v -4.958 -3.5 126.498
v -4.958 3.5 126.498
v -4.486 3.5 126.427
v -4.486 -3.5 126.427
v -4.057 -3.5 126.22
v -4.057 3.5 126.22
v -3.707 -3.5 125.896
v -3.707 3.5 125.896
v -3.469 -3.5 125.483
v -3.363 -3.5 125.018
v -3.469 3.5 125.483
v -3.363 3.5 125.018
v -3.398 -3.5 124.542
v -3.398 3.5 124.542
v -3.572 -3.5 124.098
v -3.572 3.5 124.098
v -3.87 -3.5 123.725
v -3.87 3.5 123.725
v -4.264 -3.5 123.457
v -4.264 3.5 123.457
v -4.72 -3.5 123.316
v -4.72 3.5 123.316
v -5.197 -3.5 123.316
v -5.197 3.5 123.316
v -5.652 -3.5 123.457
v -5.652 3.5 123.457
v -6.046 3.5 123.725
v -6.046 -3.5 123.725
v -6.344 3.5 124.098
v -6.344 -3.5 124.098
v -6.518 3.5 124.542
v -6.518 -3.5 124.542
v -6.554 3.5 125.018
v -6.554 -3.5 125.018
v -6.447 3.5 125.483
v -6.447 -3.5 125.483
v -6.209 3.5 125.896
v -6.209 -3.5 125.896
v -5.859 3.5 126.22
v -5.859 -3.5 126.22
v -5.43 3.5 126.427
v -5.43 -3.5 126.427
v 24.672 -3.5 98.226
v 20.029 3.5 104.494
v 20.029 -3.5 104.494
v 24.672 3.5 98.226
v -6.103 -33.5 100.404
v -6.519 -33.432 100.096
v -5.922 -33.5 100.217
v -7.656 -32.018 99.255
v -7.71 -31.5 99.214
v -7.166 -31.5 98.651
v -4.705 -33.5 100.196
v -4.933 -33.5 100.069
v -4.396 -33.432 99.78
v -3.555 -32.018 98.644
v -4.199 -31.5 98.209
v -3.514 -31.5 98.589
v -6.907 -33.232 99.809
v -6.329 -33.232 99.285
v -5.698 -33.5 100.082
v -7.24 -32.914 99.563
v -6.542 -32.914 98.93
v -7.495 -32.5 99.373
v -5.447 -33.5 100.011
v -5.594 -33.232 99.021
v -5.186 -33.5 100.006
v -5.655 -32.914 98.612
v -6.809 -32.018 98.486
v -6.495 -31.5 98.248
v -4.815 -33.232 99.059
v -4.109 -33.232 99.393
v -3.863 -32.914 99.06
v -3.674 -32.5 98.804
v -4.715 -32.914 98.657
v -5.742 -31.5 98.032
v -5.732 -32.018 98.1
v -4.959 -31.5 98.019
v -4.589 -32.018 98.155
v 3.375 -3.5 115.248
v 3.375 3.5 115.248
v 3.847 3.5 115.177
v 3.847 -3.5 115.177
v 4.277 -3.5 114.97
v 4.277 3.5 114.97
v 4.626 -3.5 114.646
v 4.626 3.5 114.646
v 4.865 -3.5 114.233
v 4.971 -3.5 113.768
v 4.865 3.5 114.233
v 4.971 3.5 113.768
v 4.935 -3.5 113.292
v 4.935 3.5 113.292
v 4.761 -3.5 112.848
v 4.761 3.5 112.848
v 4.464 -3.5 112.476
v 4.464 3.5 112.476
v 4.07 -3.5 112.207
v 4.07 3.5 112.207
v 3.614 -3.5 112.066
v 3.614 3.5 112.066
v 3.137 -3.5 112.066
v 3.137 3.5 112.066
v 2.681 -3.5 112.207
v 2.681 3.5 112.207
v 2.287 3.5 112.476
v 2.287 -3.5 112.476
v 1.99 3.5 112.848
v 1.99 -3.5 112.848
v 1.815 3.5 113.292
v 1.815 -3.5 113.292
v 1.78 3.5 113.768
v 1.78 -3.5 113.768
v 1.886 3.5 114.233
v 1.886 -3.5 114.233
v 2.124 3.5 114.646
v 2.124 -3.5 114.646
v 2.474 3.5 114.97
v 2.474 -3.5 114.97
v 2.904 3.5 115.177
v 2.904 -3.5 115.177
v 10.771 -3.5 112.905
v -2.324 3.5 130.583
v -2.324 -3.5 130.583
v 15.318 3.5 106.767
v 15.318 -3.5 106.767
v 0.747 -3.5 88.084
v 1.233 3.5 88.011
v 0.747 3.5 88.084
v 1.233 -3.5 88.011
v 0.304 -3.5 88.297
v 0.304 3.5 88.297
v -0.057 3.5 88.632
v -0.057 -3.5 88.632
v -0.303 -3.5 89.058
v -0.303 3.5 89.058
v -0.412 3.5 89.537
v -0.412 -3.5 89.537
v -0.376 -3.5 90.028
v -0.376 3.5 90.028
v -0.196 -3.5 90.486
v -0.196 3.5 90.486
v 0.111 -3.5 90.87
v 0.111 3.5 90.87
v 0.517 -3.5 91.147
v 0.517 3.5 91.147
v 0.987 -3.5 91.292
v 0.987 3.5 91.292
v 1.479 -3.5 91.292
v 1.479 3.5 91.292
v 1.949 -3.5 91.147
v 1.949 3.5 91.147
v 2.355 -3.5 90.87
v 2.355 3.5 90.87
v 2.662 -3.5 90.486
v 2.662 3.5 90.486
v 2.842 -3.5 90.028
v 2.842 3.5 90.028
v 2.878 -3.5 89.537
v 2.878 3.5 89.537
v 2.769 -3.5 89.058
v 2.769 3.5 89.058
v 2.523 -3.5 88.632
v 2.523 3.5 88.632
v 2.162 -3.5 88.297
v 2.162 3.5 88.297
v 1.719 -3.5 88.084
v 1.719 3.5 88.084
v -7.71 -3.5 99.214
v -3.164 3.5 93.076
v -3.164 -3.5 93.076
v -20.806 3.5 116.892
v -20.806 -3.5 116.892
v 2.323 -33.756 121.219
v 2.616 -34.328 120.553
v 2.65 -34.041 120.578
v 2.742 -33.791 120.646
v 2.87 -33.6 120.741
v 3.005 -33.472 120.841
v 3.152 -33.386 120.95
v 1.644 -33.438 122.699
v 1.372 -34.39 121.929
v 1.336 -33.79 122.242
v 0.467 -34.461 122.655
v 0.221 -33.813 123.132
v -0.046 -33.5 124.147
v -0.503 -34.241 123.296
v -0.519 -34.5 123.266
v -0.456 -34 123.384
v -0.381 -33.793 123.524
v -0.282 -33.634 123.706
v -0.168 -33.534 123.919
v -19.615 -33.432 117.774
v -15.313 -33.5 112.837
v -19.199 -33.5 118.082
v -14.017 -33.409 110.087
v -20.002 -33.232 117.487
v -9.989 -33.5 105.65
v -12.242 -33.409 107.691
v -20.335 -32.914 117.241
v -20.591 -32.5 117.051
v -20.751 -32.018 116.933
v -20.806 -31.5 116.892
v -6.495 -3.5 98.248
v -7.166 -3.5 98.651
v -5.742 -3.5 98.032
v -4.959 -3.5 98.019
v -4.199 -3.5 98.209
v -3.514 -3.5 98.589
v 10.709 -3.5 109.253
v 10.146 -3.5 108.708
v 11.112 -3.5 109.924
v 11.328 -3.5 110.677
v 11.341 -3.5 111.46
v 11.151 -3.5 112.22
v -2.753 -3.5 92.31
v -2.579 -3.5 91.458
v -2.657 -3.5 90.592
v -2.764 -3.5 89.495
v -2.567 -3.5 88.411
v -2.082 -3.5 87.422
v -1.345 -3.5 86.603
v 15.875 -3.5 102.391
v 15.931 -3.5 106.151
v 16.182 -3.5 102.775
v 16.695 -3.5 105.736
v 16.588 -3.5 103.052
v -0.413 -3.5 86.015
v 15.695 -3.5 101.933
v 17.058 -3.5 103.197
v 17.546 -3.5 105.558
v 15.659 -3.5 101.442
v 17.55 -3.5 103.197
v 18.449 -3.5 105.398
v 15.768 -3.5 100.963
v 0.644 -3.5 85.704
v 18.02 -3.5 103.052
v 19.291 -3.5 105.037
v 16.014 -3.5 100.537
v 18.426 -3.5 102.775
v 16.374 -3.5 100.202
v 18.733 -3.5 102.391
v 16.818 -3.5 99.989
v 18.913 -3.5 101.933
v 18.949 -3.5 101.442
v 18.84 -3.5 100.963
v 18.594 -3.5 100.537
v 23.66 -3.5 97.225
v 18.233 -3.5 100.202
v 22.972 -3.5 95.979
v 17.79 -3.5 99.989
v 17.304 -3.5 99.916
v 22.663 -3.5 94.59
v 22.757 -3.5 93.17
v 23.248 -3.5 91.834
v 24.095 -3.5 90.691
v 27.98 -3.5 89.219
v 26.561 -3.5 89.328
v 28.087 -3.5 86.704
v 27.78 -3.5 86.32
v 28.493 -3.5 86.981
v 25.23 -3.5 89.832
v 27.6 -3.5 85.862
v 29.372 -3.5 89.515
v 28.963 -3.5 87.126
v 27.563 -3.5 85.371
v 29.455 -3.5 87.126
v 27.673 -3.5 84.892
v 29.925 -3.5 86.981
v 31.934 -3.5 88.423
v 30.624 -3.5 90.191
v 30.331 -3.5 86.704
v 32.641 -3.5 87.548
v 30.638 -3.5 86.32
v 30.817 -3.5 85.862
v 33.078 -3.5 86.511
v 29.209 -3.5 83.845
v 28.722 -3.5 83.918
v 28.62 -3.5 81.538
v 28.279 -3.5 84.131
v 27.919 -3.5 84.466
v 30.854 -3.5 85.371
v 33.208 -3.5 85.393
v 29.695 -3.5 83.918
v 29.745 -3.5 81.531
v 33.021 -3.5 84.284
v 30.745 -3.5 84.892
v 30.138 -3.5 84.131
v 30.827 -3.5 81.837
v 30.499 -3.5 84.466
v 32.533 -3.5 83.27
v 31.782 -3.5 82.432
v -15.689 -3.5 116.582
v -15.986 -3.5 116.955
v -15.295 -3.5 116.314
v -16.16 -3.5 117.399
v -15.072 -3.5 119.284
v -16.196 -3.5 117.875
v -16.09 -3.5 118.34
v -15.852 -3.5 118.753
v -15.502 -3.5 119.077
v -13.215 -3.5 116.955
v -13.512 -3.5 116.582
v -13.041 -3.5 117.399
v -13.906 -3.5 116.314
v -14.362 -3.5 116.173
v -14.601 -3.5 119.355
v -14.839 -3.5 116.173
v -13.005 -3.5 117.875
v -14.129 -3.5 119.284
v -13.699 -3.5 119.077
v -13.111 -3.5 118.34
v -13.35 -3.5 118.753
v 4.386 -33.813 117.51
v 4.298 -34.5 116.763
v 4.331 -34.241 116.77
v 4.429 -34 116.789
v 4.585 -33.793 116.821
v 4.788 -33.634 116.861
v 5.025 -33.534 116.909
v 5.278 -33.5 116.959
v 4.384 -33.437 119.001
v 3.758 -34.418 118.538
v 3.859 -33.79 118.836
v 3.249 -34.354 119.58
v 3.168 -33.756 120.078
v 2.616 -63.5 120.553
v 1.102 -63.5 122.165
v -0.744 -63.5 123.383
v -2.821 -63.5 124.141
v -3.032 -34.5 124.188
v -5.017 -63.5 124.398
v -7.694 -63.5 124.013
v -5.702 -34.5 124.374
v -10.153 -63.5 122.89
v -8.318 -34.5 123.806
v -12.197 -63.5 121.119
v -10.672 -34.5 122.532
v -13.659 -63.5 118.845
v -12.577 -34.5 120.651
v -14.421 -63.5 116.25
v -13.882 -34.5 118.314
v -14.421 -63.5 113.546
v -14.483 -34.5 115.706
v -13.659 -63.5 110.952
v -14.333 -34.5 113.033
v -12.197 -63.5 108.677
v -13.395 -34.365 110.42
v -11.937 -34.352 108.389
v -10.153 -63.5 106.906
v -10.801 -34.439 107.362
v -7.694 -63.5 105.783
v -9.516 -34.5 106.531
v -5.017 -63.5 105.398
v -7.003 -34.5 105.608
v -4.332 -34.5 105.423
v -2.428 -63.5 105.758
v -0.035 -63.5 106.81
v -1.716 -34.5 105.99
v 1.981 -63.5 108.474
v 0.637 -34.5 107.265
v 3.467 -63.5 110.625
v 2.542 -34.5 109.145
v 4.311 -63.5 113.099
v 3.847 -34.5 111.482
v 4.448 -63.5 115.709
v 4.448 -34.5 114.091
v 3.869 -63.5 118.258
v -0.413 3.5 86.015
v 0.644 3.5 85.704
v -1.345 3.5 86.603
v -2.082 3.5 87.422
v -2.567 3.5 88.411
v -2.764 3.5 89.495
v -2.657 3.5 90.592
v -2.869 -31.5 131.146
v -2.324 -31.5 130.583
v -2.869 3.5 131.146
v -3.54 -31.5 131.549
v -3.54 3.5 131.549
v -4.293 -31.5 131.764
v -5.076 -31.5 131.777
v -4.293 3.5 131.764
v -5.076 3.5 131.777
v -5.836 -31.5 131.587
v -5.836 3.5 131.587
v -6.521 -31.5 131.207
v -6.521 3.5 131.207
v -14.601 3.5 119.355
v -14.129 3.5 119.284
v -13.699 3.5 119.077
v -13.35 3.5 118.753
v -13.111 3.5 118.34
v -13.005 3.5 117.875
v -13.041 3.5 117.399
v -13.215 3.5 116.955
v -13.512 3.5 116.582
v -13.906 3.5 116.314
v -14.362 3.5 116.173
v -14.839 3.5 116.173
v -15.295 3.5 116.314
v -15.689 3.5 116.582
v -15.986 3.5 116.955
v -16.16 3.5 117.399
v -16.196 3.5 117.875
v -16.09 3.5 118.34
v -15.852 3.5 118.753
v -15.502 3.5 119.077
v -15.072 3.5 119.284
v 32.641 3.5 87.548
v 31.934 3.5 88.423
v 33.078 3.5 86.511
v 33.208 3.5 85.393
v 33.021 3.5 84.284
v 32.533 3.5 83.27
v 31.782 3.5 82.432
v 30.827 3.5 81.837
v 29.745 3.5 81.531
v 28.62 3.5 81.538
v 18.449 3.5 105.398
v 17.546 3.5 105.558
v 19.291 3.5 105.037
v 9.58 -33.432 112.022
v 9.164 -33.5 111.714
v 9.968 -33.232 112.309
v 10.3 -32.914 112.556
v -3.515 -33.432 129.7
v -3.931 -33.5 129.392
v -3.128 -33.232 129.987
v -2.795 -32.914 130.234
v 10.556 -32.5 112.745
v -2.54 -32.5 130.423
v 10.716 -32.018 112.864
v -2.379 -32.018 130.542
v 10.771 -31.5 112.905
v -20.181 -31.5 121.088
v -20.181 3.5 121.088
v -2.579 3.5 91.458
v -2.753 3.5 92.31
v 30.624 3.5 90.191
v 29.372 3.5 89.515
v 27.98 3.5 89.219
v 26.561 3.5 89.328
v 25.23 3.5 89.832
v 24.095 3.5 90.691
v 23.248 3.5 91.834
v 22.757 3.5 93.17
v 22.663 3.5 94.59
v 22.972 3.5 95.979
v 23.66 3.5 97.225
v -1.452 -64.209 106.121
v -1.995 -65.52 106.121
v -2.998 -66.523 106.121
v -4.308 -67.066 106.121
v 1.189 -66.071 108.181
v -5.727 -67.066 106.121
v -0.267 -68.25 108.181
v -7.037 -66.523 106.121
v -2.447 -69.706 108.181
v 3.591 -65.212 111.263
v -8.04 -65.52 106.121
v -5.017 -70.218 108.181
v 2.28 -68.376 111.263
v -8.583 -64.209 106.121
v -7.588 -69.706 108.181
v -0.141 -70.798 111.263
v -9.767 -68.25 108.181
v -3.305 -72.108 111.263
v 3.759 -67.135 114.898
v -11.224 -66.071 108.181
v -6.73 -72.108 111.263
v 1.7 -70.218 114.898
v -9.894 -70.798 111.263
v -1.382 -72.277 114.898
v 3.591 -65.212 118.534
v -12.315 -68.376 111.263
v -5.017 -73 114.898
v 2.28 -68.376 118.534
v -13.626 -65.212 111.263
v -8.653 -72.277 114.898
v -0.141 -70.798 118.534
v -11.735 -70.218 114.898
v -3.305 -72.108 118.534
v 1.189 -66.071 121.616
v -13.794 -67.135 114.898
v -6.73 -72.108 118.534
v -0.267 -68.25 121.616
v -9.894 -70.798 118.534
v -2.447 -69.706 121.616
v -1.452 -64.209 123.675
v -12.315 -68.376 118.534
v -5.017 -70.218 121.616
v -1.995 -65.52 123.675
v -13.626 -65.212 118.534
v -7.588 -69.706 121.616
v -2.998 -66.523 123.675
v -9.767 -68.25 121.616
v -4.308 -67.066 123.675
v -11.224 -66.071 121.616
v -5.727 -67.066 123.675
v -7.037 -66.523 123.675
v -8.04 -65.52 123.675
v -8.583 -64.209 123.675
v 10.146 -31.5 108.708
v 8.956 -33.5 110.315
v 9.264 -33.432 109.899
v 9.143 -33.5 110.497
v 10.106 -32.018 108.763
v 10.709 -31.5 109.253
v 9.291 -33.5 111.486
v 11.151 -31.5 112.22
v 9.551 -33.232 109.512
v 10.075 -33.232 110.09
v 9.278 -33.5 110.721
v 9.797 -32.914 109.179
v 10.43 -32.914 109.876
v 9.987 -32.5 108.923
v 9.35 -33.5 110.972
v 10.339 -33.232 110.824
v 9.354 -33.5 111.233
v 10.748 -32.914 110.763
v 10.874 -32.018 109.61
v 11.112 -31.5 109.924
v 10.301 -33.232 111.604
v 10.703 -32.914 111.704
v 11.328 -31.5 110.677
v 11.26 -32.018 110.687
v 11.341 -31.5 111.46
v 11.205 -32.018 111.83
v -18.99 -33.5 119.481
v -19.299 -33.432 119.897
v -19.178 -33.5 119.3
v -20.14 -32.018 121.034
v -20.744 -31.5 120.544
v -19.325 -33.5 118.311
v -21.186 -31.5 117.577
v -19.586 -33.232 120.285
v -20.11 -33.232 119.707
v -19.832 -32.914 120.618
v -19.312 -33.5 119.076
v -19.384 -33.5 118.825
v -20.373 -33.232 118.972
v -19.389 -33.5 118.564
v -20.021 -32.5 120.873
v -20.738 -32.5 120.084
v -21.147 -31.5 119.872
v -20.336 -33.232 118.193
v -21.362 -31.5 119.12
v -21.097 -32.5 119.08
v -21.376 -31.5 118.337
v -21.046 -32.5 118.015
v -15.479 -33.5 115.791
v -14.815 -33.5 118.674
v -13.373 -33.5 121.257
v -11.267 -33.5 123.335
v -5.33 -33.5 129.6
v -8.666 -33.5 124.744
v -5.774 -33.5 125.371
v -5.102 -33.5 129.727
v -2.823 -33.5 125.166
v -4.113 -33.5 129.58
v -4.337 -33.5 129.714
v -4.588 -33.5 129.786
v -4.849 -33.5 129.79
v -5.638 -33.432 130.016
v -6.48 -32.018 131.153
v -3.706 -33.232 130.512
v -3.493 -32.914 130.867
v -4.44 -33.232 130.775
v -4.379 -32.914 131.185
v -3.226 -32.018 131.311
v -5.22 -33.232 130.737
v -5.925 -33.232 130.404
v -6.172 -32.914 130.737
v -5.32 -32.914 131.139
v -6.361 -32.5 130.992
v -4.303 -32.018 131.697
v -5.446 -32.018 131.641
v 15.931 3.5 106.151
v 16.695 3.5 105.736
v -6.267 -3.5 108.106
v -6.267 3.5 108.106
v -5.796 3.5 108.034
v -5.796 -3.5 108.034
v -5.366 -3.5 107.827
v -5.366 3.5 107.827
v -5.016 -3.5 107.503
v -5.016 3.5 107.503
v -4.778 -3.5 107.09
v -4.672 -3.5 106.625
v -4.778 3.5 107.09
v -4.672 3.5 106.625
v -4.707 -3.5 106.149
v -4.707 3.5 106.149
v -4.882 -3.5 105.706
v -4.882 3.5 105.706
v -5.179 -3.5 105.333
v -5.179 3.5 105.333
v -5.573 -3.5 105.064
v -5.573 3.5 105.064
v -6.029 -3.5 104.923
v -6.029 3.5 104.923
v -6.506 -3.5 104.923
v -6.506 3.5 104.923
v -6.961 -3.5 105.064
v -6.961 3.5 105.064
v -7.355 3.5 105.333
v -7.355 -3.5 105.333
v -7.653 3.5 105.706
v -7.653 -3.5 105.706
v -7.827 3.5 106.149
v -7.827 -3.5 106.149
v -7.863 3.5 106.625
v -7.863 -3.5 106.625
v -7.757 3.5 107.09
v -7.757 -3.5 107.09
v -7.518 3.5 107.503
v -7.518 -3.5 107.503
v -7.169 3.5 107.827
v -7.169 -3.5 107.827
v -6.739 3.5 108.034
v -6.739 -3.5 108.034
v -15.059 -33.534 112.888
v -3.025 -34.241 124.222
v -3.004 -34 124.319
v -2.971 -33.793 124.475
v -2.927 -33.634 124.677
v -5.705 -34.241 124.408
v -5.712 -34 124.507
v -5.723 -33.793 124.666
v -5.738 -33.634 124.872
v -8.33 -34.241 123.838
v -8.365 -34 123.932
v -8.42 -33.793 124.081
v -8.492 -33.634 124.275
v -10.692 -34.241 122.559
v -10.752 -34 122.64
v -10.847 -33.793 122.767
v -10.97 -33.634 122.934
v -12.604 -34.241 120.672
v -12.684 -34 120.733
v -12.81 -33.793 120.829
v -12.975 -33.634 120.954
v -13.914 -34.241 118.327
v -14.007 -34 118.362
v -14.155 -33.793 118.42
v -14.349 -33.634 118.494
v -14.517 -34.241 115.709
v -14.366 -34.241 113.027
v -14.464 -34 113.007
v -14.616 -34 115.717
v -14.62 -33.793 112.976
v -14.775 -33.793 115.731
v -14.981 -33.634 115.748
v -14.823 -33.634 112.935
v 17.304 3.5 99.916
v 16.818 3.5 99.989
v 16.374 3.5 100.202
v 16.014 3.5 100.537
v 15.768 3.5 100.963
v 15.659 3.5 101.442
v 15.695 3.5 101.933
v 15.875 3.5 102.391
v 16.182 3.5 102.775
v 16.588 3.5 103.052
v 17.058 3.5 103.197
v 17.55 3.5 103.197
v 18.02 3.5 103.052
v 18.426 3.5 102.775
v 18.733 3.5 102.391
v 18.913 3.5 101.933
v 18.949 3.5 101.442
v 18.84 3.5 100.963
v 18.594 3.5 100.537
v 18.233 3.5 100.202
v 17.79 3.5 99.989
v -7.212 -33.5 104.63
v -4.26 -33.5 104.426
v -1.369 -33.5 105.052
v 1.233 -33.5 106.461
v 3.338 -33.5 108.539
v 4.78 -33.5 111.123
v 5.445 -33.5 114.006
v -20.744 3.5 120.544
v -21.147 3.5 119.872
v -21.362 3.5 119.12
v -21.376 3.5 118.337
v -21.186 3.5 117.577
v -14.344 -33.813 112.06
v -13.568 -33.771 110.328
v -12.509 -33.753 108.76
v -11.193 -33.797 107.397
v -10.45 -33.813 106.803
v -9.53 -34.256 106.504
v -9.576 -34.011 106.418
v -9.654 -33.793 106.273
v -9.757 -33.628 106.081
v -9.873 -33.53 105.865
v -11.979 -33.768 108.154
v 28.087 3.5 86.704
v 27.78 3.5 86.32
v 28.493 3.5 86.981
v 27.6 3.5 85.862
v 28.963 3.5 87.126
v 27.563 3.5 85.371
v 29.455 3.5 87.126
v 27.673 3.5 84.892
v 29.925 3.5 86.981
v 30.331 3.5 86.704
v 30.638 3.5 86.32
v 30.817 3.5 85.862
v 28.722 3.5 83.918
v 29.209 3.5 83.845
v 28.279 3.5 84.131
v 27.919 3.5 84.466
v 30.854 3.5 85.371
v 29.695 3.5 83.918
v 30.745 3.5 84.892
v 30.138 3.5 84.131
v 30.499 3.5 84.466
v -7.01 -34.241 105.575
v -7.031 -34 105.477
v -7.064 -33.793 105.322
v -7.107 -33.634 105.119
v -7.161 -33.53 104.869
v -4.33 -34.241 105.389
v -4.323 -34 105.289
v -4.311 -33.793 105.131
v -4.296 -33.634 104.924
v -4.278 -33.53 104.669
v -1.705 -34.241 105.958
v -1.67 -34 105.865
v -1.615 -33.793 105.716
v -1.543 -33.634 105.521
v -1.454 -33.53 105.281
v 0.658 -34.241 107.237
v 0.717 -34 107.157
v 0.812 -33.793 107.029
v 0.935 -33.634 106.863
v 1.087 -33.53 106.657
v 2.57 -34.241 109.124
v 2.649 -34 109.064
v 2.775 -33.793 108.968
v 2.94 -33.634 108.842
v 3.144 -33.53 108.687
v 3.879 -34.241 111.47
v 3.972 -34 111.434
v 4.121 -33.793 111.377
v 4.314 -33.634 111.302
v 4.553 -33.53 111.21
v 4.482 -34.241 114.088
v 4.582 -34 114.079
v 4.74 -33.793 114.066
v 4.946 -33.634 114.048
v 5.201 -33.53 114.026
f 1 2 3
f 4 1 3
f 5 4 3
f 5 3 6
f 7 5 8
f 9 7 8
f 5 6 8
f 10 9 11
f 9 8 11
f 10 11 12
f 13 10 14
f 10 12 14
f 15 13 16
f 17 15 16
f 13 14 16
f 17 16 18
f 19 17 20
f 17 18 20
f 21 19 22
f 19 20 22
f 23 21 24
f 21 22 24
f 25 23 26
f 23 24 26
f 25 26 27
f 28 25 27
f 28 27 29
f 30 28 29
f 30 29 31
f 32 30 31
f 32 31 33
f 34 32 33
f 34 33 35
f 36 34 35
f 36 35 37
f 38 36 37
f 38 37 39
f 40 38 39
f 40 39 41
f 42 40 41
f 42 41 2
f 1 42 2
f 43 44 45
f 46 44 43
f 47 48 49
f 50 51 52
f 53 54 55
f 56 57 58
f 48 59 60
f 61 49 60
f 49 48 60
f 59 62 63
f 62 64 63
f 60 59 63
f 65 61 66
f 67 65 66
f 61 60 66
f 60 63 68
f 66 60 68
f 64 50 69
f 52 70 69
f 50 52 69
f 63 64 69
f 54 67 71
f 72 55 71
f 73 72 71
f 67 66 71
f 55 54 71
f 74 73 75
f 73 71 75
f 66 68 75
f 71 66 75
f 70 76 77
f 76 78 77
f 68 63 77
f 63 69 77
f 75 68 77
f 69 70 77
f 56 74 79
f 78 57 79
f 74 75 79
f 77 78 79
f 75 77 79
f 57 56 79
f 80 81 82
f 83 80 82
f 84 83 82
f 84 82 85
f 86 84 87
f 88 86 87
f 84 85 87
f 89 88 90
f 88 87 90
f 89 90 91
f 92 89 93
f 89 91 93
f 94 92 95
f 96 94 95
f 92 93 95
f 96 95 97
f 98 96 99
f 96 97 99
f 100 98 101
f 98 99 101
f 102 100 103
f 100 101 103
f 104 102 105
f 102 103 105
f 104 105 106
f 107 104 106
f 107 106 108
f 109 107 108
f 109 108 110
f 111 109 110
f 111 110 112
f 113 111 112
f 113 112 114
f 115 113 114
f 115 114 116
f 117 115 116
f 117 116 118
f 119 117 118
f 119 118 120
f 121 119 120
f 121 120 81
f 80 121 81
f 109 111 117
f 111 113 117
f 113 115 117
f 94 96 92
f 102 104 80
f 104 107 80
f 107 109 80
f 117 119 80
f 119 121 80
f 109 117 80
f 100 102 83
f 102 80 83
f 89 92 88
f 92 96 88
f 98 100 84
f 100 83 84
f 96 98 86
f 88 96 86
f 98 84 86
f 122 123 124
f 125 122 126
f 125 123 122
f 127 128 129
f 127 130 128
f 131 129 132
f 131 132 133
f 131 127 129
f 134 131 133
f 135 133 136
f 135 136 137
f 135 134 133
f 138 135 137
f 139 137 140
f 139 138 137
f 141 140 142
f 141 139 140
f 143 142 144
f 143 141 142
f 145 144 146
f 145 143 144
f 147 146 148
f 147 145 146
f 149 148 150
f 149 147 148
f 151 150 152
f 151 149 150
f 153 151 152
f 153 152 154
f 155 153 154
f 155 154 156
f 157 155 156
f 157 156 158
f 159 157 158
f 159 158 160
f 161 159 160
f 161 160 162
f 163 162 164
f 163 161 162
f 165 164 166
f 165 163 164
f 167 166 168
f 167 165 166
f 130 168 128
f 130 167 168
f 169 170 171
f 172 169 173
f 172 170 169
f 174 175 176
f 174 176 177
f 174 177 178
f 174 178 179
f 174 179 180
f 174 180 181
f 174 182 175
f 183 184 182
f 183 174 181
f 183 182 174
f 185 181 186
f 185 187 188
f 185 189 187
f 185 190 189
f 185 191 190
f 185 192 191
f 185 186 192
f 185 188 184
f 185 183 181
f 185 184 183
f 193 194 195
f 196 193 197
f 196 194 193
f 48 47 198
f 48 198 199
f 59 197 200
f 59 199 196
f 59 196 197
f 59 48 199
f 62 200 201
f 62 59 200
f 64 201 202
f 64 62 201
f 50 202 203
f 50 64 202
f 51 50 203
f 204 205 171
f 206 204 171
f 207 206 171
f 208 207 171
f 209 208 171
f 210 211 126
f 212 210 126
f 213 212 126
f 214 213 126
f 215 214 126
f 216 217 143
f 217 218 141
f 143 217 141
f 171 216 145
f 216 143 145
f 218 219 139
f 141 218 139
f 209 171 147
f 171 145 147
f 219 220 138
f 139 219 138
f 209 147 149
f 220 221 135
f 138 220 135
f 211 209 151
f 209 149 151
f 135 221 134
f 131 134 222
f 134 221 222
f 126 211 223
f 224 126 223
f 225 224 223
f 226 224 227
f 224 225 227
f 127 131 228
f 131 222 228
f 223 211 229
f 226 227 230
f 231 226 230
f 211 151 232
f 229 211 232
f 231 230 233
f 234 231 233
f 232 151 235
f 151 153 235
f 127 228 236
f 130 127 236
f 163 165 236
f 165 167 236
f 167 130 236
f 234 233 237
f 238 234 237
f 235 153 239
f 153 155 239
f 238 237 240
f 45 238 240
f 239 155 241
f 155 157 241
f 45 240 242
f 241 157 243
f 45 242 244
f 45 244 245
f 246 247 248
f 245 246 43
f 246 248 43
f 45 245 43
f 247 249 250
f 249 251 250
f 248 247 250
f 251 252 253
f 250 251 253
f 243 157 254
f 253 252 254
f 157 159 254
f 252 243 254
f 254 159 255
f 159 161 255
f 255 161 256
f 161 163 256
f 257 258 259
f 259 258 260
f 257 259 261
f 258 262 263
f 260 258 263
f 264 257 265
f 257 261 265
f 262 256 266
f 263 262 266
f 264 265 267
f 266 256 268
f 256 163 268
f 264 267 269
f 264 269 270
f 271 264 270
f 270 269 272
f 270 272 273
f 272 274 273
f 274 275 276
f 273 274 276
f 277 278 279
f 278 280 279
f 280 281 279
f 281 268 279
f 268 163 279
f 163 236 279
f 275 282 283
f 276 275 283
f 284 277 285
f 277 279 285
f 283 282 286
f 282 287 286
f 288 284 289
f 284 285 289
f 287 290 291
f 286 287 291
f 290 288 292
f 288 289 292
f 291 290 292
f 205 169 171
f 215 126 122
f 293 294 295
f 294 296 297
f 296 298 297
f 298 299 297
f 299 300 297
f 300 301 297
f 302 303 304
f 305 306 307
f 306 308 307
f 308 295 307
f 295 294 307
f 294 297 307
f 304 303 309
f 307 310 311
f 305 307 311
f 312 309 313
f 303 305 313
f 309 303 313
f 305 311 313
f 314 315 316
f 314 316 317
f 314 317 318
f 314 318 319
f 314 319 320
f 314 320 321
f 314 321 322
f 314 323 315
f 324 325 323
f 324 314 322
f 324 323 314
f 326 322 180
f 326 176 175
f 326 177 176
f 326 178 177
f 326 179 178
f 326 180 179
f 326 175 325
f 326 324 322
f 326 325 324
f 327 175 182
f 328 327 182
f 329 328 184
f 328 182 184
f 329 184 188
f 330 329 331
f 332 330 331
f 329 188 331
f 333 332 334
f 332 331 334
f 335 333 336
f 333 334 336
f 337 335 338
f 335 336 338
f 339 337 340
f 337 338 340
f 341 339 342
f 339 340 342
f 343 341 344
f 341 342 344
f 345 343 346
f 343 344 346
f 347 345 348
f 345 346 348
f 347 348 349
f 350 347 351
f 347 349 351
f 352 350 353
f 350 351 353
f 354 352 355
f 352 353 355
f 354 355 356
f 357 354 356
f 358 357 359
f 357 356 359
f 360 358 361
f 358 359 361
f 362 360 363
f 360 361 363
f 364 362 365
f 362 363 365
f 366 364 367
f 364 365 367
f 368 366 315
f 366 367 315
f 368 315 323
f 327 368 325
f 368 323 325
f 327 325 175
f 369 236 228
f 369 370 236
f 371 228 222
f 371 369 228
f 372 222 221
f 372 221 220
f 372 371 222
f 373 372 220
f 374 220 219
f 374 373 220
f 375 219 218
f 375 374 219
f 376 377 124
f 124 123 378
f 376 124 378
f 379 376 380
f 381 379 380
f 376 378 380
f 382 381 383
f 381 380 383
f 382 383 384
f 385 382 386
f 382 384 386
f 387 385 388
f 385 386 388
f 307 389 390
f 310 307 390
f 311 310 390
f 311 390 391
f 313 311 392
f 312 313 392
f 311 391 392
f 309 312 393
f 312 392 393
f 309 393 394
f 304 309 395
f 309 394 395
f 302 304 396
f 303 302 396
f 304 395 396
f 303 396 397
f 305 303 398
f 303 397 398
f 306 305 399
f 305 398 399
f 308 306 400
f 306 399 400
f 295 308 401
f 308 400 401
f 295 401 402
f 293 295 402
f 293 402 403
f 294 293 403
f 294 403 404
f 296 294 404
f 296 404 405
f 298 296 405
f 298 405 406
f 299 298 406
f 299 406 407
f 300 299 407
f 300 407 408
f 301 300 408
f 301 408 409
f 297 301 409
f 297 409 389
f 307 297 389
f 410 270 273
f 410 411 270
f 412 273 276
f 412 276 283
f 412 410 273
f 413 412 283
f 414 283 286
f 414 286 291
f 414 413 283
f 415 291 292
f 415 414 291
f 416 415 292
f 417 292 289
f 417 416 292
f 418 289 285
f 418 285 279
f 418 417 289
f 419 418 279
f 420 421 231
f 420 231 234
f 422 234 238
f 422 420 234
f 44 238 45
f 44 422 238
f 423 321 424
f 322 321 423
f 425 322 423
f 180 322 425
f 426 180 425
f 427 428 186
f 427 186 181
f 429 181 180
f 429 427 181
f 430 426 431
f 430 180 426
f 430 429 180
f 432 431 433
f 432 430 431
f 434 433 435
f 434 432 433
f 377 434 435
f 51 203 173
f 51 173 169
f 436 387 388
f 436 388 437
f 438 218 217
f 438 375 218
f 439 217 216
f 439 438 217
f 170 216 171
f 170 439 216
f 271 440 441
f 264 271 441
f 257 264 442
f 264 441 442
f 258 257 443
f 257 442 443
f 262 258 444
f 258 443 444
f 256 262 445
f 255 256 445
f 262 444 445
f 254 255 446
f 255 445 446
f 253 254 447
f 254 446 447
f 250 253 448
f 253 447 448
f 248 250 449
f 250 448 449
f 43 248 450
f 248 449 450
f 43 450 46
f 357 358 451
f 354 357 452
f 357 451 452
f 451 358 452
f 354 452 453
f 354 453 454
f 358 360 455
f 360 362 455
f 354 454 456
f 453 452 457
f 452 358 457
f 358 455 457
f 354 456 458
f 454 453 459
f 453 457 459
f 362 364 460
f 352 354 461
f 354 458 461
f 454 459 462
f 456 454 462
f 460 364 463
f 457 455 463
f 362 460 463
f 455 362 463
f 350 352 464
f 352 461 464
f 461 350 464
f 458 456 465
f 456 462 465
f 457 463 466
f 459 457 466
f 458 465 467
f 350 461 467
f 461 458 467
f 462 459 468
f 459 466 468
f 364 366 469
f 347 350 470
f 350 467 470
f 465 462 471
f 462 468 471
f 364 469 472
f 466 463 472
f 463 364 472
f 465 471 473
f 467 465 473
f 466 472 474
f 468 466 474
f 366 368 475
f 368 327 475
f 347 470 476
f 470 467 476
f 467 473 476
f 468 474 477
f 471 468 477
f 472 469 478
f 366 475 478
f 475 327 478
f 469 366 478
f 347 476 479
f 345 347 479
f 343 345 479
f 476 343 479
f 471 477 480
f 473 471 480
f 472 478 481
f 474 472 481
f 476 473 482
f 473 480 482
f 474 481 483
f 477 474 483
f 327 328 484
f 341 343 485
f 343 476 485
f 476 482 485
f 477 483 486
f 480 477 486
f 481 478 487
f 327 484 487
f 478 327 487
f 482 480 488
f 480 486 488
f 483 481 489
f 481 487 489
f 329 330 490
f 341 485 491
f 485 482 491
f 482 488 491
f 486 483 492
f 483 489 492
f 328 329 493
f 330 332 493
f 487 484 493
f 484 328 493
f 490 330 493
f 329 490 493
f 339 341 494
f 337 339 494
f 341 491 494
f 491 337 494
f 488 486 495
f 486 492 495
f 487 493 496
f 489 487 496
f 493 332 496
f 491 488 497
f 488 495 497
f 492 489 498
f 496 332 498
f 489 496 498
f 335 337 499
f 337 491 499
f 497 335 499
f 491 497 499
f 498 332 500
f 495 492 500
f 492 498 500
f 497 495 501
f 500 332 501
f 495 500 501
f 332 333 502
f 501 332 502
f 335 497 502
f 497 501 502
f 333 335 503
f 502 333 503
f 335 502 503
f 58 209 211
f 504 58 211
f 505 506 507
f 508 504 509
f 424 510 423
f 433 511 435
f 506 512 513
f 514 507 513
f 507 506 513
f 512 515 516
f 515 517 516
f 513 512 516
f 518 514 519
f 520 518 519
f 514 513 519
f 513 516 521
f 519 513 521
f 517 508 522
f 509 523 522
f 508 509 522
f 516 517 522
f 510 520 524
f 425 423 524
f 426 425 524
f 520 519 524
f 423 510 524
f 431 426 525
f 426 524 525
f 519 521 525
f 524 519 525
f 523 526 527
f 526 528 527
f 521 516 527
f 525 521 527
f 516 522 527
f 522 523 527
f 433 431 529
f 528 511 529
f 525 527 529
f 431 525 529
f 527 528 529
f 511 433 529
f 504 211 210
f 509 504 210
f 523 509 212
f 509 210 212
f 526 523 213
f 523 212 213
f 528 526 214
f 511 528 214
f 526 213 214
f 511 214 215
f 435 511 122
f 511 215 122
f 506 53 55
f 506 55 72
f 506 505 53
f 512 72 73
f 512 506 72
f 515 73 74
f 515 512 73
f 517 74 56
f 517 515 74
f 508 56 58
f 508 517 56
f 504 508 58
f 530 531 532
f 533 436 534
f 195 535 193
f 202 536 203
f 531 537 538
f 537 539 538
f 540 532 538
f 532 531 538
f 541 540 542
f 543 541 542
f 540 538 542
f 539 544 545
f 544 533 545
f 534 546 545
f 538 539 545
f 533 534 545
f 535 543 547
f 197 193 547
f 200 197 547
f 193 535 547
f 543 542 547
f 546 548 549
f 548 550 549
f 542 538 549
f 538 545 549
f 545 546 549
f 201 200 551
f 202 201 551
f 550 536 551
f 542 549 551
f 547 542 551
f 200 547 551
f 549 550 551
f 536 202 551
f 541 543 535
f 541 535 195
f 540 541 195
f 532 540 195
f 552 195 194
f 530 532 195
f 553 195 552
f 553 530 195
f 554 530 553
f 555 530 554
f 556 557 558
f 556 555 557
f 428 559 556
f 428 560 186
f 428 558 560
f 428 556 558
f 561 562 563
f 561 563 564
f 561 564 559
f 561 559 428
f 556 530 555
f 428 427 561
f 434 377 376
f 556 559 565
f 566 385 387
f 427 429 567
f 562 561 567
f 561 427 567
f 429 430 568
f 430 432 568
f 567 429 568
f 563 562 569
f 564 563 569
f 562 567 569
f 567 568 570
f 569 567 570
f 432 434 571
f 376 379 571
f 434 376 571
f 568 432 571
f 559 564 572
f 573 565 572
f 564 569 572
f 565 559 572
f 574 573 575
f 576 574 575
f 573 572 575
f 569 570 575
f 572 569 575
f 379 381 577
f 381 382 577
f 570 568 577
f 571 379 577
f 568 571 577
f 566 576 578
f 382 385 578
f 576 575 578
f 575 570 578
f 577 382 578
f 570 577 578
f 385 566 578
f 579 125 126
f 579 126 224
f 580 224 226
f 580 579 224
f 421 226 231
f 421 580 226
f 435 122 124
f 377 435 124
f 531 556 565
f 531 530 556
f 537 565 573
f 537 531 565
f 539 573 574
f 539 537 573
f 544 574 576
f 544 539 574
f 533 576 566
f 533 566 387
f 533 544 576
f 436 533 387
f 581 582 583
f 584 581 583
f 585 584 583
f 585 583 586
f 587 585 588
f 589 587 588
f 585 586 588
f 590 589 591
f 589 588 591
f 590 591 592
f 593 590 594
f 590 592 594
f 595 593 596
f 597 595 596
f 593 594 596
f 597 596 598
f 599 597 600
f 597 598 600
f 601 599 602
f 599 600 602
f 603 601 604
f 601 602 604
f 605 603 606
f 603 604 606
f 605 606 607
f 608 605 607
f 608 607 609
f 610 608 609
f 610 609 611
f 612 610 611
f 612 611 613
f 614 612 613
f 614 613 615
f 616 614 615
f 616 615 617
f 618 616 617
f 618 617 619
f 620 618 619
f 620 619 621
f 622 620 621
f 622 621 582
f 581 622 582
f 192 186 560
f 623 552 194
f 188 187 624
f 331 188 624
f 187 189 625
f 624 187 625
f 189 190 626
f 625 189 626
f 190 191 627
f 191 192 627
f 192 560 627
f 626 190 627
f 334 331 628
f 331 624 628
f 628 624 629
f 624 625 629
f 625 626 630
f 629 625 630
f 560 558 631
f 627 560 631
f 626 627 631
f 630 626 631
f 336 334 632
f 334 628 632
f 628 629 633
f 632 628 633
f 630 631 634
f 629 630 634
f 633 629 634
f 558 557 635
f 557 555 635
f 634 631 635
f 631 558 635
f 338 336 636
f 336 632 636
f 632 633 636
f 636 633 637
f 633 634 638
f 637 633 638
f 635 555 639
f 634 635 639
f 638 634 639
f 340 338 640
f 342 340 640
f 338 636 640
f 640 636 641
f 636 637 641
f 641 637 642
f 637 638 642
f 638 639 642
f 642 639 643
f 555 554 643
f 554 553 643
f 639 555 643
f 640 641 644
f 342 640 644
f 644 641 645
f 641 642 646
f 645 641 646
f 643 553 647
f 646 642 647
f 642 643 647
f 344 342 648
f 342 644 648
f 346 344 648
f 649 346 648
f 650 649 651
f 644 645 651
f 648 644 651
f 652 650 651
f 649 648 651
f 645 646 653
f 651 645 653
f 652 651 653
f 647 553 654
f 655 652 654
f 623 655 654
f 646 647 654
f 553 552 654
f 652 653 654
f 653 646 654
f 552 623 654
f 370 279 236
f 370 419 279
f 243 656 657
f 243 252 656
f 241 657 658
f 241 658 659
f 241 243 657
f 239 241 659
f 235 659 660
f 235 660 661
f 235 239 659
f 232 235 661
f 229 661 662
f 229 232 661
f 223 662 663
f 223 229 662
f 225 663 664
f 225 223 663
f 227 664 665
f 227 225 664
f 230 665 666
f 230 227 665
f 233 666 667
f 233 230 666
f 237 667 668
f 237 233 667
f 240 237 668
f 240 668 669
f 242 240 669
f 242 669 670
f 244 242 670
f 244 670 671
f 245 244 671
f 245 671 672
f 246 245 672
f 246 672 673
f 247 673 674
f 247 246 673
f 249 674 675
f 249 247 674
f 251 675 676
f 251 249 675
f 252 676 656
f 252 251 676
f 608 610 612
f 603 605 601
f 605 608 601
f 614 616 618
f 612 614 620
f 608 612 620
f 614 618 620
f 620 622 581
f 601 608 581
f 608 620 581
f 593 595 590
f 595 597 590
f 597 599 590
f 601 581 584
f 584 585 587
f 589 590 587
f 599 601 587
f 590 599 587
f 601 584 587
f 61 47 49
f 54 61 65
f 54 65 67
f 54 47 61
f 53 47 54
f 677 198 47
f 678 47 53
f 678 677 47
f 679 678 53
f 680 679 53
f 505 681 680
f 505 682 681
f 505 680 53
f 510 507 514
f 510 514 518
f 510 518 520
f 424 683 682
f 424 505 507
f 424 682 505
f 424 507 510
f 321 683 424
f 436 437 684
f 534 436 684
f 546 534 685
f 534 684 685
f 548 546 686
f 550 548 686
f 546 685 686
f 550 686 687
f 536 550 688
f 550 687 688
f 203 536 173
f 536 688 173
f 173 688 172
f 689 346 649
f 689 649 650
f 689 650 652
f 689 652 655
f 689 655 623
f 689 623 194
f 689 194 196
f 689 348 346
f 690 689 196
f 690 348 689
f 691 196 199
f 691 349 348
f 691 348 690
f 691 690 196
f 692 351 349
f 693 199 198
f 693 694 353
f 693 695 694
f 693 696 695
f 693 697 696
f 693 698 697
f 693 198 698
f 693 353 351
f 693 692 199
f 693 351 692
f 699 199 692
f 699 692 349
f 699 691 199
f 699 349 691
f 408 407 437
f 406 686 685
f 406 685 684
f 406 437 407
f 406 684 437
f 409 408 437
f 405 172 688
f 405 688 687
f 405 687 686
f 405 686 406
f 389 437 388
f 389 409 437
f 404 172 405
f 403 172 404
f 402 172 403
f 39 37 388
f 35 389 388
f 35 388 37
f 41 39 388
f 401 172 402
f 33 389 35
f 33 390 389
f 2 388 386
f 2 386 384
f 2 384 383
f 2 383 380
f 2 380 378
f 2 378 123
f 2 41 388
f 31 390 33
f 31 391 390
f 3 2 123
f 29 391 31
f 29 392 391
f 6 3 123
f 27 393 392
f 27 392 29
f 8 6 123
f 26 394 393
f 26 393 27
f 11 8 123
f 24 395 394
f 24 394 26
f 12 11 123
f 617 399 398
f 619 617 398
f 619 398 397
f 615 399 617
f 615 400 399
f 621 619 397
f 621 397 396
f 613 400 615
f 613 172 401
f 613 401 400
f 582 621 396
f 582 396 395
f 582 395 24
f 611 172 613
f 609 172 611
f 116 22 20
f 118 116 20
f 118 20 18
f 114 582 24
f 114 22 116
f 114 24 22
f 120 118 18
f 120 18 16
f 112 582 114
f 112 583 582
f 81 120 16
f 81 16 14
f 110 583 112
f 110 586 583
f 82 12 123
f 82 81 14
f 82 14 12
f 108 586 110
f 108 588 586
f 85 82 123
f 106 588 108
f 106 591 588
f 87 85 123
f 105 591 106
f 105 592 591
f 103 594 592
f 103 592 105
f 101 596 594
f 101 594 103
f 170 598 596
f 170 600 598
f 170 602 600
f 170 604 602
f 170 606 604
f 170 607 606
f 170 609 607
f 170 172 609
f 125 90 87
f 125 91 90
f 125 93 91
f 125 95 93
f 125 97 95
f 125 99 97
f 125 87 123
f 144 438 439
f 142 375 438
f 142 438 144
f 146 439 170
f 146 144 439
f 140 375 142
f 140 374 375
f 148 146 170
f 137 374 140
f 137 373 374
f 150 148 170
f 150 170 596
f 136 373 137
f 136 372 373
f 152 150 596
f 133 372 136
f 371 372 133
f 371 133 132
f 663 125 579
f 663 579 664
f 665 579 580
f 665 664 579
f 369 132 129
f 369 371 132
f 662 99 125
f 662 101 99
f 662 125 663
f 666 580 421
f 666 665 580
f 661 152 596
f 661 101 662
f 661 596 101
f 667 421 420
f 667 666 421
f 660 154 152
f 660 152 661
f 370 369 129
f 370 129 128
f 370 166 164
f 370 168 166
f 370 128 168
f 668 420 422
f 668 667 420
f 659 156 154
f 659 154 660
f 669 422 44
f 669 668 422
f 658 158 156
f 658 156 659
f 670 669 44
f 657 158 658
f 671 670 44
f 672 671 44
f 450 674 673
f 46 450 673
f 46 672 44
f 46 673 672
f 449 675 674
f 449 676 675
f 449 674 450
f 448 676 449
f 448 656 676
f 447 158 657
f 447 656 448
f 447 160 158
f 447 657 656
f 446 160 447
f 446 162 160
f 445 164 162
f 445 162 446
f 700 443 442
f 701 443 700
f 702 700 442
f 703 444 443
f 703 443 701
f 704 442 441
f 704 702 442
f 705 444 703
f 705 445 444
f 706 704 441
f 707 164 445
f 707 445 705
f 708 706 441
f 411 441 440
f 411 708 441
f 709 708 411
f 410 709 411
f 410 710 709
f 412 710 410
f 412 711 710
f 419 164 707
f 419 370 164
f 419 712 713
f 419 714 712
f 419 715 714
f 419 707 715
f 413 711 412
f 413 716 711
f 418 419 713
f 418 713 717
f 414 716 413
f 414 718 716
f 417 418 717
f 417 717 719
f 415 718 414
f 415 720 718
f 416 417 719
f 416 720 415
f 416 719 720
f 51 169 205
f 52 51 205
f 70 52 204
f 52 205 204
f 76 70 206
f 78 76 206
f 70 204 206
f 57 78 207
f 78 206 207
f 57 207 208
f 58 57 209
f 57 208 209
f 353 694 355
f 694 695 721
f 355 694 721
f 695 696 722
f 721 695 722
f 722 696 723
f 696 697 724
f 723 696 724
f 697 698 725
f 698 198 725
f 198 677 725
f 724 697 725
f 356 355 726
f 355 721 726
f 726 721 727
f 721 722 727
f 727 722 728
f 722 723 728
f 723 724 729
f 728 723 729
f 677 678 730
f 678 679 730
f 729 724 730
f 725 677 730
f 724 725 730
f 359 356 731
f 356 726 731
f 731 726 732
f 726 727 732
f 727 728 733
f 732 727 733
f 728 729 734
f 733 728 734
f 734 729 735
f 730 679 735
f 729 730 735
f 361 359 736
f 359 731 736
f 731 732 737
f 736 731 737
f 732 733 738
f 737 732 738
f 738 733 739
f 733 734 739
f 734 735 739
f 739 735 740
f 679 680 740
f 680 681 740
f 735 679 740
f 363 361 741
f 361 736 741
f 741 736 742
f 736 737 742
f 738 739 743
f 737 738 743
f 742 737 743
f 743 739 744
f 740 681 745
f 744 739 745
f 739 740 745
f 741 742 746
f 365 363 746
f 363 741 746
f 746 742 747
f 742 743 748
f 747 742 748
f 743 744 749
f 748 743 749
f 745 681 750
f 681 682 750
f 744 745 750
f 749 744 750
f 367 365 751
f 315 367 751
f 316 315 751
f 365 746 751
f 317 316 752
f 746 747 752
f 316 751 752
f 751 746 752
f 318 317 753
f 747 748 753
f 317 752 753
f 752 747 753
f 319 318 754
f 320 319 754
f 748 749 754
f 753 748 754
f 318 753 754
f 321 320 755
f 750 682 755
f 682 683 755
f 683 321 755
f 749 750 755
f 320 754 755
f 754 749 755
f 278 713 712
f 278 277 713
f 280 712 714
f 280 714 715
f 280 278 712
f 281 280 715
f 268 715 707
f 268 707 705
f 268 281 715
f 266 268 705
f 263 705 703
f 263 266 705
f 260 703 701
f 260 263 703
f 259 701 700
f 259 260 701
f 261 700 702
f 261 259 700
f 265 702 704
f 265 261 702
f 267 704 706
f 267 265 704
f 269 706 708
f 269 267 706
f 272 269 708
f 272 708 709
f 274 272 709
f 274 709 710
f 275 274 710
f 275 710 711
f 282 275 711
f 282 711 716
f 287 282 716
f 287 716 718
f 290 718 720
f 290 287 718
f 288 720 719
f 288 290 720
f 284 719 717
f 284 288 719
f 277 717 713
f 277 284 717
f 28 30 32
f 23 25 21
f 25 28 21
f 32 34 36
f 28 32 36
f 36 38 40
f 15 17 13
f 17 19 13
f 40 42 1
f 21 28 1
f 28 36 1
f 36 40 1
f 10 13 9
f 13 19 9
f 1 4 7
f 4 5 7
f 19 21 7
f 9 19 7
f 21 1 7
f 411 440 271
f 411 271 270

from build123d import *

# Parameters (mm, degrees)
SKETCH1_R           = 1.650000007
BOSS_EXTRUDE1_DEPTH = 3.5
SKETCH8_R           = 5
CUT_EXTRUDE3_DEPTH  = 10
SKETCH9_R           = 1.6
CUT_EXTRUDE4_DEPTH  = 10
BOSS_EXTRUDE5_DEPTH = 30
FILLET4_R           = 2
SKETCH13_R          = 9.5
BOSS_EXTRUDE6_DEPTH = 30
FILLET5_R           = 1
REVOLVE2_ANGLE      = 180


with BuildPart() as part:
    # Sketch1 → Boss-Extrude1 (new, symmetric)
    with BuildSketch(Plane(origin=(0, 0, 0), x_dir=(1, 0, 0), z_dir=(0, 1, 0))):
        with BuildLine():
            Line((-3.163944782, -93.076388076), (-20.805834618, -116.891940565))
            ThreePointArc((-20.805834618, -116.891940565), (-21.362478255, -119.119545961), (-20.180929864, -121.088307332))
            Line((-20.180929864, -121.088307332), (-6.520660553, -131.207449705))
            ThreePointArc((-6.520660553, -131.207449705), (-4.293055157, -131.764093342), (-2.324293786, -130.582544951))
            Line((-2.324293786, -130.582544951), (15.317595998, -106.766992534))
            ThreePointArc((15.317595998, -106.766992534), (16.298016652, -105.915587831), (17.546382486, -105.558240139))
            ThreePointArc((17.546382486, -105.558240139), (18.880171652, -105.241928098), (20.028844772, -104.493865997))
            Line((20.028844772, -104.493865997), (31.933718152, -88.422960925))
            ThreePointArc((31.933718152, -88.422960925), (32.812947077, -83.759740105), (28.619624318, -81.538318002))
            Line((28.619624318, -81.538318002), (0.643845867, -85.704349694))
            ThreePointArc((0.643845867, -85.704349694), (-2.081865152, -87.422063847), (-2.657041002, -90.592113564))
            ThreePointArc((-2.657041002, -90.592113564), (-2.635147269, -91.890433717), (-3.163944782, -93.076388076))
        make_face()
        with Locations(Location((1.233011719, -89.660722224, 0), (0, 0, 90))):
            Circle(SKETCH1_R, mode=Mode.SUBTRACT)
        with Locations(Location((29.20879017, -85.494690532, 0), (0, 0, 90))):
            Circle(SKETCH1_R, mode=Mode.SUBTRACT)
        with Locations(Location((17.30391679, -101.565595604, 0), (0, 0, 90))):
            Circle(SKETCH1_R, mode=Mode.SUBTRACT)
    extrude(amount=BOSS_EXTRUDE1_DEPTH, both=True)

    # Sketch8 → Cut-Extrude3 (cut)
    with BuildSketch(Plane(origin=(0, 3.5, 0), x_dir=(1, 0, 0), z_dir=(0, 1, 0))):
        with Locations((27.647963735, -94.208486751)):
            Circle(SKETCH8_R)
    extrude(amount=-CUT_EXTRUDE3_DEPTH, mode=Mode.SUBTRACT)

    # Sketch9 → Cut-Extrude4 (cut)
    with BuildSketch(Plane(origin=(0, 3.5, 0), x_dir=(1, 0, 0), z_dir=(0, 1, 0))):
        with Locations(Location((-6.267193351, -106.505511433, 0), (0, 0, 270))):
            Circle(SKETCH9_R)
        with Locations(Location((3.375349692, -113.648435461, 0), (0, 0, 270))):
            Circle(SKETCH9_R)
        with Locations(Location((-4.958061673, -124.898069011, 0), (0, 0, 270))):
            Circle(SKETCH9_R)
        with Locations(Location((-14.600604716, -117.755144983, 0), (0, 0, 270))):
            Circle(SKETCH9_R)
    extrude(amount=-CUT_EXTRUDE4_DEPTH, mode=Mode.SUBTRACT)

    # Sketch11 → Boss-Extrude5 (add)
    with BuildSketch(Plane.XZ.offset(3.5)):
        with BuildLine():
            Line((-3.514107133, 98.589040232), (10.146162178, 108.708182605))
            ThreePointArc((10.146162178, 108.708182605), (11.327710569, 110.676943976), (10.771066932, 112.904549372))
            Line((10.771066932, 112.904549372), (-2.324293786, 130.582544951))
            ThreePointArc((-2.324293786, 130.582544951), (-4.293055157, 131.764093342), (-6.520660553, 131.207449705))
            Line((-6.520660553, 131.207449705), (-20.180929864, 121.088307332))
            ThreePointArc((-20.180929864, 121.088307332), (-21.362478255, 119.119545961), (-20.805834618, 116.891940565))
            Line((-20.805834618, 116.891940565), (-7.710473901, 99.213944986))
            ThreePointArc((-7.710473901, 99.213944986), (-5.741712529, 98.032396595), (-3.514107133, 98.589040232))
        make_face()
    extrude(amount=BOSS_EXTRUDE5_DEPTH)

    # Fillet4
    fillet4_edges = [part.edges().sort_by_distance(p)[0] for p in [
        (-21.362478255, -33.5, 119.119545961),
        (-14.258154259, -33.5, 108.052942775),
        (-5.741712529, -33.5, 98.032396595),
        (3.316027522, -33.5, 103.648611418),
        (11.327710569, -33.5, 110.676943976),
        (4.223386573, -33.5, 121.743547162),
        (-4.293055157, -33.5, 131.764093342),
        (-13.350795209, -33.5, 126.147878519),
    ]]
    fillet(fillet4_edges, radius=FILLET4_R)

    # Sketch13 → Boss-Extrude6 (add)
    with BuildSketch(Plane.XZ.offset(33.5)):
        with Locations(Location((-5.017383843, 114.898244969, 0), (0, 0, 36.530004657))):
            Circle(SKETCH13_R)
    extrude(amount=BOSS_EXTRUDE6_DEPTH)

    # Fillet5
    fillet5_edges = [part.edges().sort_by_distance(p)[0] for p in [
        (-10.672198638, -33.5, 122.531924922),
        (0.637430952, -33.5, 107.264565015),
    ]]
    fillet(fillet5_edges, radius=FILLET5_R)

    # Sketch14 → Revolve2 (revolve)
    with BuildSketch(Plane.XZ.offset(63.5)):
        with BuildLine():
            Line((-5.017383843, 124.398244969), (-5.017383843, 105.398244968))
            ThreePointArc((-5.017383843, 105.398244968), (4.482616157, 114.898244969), (-5.017383843, 124.398244969))
        make_face()
    revolve(axis=Axis((-5.017383843, -63.5, 124.398244969), (0, 0, -1)), revolution_arc=REVOLVE2_ANGLE)


solid = part.part
